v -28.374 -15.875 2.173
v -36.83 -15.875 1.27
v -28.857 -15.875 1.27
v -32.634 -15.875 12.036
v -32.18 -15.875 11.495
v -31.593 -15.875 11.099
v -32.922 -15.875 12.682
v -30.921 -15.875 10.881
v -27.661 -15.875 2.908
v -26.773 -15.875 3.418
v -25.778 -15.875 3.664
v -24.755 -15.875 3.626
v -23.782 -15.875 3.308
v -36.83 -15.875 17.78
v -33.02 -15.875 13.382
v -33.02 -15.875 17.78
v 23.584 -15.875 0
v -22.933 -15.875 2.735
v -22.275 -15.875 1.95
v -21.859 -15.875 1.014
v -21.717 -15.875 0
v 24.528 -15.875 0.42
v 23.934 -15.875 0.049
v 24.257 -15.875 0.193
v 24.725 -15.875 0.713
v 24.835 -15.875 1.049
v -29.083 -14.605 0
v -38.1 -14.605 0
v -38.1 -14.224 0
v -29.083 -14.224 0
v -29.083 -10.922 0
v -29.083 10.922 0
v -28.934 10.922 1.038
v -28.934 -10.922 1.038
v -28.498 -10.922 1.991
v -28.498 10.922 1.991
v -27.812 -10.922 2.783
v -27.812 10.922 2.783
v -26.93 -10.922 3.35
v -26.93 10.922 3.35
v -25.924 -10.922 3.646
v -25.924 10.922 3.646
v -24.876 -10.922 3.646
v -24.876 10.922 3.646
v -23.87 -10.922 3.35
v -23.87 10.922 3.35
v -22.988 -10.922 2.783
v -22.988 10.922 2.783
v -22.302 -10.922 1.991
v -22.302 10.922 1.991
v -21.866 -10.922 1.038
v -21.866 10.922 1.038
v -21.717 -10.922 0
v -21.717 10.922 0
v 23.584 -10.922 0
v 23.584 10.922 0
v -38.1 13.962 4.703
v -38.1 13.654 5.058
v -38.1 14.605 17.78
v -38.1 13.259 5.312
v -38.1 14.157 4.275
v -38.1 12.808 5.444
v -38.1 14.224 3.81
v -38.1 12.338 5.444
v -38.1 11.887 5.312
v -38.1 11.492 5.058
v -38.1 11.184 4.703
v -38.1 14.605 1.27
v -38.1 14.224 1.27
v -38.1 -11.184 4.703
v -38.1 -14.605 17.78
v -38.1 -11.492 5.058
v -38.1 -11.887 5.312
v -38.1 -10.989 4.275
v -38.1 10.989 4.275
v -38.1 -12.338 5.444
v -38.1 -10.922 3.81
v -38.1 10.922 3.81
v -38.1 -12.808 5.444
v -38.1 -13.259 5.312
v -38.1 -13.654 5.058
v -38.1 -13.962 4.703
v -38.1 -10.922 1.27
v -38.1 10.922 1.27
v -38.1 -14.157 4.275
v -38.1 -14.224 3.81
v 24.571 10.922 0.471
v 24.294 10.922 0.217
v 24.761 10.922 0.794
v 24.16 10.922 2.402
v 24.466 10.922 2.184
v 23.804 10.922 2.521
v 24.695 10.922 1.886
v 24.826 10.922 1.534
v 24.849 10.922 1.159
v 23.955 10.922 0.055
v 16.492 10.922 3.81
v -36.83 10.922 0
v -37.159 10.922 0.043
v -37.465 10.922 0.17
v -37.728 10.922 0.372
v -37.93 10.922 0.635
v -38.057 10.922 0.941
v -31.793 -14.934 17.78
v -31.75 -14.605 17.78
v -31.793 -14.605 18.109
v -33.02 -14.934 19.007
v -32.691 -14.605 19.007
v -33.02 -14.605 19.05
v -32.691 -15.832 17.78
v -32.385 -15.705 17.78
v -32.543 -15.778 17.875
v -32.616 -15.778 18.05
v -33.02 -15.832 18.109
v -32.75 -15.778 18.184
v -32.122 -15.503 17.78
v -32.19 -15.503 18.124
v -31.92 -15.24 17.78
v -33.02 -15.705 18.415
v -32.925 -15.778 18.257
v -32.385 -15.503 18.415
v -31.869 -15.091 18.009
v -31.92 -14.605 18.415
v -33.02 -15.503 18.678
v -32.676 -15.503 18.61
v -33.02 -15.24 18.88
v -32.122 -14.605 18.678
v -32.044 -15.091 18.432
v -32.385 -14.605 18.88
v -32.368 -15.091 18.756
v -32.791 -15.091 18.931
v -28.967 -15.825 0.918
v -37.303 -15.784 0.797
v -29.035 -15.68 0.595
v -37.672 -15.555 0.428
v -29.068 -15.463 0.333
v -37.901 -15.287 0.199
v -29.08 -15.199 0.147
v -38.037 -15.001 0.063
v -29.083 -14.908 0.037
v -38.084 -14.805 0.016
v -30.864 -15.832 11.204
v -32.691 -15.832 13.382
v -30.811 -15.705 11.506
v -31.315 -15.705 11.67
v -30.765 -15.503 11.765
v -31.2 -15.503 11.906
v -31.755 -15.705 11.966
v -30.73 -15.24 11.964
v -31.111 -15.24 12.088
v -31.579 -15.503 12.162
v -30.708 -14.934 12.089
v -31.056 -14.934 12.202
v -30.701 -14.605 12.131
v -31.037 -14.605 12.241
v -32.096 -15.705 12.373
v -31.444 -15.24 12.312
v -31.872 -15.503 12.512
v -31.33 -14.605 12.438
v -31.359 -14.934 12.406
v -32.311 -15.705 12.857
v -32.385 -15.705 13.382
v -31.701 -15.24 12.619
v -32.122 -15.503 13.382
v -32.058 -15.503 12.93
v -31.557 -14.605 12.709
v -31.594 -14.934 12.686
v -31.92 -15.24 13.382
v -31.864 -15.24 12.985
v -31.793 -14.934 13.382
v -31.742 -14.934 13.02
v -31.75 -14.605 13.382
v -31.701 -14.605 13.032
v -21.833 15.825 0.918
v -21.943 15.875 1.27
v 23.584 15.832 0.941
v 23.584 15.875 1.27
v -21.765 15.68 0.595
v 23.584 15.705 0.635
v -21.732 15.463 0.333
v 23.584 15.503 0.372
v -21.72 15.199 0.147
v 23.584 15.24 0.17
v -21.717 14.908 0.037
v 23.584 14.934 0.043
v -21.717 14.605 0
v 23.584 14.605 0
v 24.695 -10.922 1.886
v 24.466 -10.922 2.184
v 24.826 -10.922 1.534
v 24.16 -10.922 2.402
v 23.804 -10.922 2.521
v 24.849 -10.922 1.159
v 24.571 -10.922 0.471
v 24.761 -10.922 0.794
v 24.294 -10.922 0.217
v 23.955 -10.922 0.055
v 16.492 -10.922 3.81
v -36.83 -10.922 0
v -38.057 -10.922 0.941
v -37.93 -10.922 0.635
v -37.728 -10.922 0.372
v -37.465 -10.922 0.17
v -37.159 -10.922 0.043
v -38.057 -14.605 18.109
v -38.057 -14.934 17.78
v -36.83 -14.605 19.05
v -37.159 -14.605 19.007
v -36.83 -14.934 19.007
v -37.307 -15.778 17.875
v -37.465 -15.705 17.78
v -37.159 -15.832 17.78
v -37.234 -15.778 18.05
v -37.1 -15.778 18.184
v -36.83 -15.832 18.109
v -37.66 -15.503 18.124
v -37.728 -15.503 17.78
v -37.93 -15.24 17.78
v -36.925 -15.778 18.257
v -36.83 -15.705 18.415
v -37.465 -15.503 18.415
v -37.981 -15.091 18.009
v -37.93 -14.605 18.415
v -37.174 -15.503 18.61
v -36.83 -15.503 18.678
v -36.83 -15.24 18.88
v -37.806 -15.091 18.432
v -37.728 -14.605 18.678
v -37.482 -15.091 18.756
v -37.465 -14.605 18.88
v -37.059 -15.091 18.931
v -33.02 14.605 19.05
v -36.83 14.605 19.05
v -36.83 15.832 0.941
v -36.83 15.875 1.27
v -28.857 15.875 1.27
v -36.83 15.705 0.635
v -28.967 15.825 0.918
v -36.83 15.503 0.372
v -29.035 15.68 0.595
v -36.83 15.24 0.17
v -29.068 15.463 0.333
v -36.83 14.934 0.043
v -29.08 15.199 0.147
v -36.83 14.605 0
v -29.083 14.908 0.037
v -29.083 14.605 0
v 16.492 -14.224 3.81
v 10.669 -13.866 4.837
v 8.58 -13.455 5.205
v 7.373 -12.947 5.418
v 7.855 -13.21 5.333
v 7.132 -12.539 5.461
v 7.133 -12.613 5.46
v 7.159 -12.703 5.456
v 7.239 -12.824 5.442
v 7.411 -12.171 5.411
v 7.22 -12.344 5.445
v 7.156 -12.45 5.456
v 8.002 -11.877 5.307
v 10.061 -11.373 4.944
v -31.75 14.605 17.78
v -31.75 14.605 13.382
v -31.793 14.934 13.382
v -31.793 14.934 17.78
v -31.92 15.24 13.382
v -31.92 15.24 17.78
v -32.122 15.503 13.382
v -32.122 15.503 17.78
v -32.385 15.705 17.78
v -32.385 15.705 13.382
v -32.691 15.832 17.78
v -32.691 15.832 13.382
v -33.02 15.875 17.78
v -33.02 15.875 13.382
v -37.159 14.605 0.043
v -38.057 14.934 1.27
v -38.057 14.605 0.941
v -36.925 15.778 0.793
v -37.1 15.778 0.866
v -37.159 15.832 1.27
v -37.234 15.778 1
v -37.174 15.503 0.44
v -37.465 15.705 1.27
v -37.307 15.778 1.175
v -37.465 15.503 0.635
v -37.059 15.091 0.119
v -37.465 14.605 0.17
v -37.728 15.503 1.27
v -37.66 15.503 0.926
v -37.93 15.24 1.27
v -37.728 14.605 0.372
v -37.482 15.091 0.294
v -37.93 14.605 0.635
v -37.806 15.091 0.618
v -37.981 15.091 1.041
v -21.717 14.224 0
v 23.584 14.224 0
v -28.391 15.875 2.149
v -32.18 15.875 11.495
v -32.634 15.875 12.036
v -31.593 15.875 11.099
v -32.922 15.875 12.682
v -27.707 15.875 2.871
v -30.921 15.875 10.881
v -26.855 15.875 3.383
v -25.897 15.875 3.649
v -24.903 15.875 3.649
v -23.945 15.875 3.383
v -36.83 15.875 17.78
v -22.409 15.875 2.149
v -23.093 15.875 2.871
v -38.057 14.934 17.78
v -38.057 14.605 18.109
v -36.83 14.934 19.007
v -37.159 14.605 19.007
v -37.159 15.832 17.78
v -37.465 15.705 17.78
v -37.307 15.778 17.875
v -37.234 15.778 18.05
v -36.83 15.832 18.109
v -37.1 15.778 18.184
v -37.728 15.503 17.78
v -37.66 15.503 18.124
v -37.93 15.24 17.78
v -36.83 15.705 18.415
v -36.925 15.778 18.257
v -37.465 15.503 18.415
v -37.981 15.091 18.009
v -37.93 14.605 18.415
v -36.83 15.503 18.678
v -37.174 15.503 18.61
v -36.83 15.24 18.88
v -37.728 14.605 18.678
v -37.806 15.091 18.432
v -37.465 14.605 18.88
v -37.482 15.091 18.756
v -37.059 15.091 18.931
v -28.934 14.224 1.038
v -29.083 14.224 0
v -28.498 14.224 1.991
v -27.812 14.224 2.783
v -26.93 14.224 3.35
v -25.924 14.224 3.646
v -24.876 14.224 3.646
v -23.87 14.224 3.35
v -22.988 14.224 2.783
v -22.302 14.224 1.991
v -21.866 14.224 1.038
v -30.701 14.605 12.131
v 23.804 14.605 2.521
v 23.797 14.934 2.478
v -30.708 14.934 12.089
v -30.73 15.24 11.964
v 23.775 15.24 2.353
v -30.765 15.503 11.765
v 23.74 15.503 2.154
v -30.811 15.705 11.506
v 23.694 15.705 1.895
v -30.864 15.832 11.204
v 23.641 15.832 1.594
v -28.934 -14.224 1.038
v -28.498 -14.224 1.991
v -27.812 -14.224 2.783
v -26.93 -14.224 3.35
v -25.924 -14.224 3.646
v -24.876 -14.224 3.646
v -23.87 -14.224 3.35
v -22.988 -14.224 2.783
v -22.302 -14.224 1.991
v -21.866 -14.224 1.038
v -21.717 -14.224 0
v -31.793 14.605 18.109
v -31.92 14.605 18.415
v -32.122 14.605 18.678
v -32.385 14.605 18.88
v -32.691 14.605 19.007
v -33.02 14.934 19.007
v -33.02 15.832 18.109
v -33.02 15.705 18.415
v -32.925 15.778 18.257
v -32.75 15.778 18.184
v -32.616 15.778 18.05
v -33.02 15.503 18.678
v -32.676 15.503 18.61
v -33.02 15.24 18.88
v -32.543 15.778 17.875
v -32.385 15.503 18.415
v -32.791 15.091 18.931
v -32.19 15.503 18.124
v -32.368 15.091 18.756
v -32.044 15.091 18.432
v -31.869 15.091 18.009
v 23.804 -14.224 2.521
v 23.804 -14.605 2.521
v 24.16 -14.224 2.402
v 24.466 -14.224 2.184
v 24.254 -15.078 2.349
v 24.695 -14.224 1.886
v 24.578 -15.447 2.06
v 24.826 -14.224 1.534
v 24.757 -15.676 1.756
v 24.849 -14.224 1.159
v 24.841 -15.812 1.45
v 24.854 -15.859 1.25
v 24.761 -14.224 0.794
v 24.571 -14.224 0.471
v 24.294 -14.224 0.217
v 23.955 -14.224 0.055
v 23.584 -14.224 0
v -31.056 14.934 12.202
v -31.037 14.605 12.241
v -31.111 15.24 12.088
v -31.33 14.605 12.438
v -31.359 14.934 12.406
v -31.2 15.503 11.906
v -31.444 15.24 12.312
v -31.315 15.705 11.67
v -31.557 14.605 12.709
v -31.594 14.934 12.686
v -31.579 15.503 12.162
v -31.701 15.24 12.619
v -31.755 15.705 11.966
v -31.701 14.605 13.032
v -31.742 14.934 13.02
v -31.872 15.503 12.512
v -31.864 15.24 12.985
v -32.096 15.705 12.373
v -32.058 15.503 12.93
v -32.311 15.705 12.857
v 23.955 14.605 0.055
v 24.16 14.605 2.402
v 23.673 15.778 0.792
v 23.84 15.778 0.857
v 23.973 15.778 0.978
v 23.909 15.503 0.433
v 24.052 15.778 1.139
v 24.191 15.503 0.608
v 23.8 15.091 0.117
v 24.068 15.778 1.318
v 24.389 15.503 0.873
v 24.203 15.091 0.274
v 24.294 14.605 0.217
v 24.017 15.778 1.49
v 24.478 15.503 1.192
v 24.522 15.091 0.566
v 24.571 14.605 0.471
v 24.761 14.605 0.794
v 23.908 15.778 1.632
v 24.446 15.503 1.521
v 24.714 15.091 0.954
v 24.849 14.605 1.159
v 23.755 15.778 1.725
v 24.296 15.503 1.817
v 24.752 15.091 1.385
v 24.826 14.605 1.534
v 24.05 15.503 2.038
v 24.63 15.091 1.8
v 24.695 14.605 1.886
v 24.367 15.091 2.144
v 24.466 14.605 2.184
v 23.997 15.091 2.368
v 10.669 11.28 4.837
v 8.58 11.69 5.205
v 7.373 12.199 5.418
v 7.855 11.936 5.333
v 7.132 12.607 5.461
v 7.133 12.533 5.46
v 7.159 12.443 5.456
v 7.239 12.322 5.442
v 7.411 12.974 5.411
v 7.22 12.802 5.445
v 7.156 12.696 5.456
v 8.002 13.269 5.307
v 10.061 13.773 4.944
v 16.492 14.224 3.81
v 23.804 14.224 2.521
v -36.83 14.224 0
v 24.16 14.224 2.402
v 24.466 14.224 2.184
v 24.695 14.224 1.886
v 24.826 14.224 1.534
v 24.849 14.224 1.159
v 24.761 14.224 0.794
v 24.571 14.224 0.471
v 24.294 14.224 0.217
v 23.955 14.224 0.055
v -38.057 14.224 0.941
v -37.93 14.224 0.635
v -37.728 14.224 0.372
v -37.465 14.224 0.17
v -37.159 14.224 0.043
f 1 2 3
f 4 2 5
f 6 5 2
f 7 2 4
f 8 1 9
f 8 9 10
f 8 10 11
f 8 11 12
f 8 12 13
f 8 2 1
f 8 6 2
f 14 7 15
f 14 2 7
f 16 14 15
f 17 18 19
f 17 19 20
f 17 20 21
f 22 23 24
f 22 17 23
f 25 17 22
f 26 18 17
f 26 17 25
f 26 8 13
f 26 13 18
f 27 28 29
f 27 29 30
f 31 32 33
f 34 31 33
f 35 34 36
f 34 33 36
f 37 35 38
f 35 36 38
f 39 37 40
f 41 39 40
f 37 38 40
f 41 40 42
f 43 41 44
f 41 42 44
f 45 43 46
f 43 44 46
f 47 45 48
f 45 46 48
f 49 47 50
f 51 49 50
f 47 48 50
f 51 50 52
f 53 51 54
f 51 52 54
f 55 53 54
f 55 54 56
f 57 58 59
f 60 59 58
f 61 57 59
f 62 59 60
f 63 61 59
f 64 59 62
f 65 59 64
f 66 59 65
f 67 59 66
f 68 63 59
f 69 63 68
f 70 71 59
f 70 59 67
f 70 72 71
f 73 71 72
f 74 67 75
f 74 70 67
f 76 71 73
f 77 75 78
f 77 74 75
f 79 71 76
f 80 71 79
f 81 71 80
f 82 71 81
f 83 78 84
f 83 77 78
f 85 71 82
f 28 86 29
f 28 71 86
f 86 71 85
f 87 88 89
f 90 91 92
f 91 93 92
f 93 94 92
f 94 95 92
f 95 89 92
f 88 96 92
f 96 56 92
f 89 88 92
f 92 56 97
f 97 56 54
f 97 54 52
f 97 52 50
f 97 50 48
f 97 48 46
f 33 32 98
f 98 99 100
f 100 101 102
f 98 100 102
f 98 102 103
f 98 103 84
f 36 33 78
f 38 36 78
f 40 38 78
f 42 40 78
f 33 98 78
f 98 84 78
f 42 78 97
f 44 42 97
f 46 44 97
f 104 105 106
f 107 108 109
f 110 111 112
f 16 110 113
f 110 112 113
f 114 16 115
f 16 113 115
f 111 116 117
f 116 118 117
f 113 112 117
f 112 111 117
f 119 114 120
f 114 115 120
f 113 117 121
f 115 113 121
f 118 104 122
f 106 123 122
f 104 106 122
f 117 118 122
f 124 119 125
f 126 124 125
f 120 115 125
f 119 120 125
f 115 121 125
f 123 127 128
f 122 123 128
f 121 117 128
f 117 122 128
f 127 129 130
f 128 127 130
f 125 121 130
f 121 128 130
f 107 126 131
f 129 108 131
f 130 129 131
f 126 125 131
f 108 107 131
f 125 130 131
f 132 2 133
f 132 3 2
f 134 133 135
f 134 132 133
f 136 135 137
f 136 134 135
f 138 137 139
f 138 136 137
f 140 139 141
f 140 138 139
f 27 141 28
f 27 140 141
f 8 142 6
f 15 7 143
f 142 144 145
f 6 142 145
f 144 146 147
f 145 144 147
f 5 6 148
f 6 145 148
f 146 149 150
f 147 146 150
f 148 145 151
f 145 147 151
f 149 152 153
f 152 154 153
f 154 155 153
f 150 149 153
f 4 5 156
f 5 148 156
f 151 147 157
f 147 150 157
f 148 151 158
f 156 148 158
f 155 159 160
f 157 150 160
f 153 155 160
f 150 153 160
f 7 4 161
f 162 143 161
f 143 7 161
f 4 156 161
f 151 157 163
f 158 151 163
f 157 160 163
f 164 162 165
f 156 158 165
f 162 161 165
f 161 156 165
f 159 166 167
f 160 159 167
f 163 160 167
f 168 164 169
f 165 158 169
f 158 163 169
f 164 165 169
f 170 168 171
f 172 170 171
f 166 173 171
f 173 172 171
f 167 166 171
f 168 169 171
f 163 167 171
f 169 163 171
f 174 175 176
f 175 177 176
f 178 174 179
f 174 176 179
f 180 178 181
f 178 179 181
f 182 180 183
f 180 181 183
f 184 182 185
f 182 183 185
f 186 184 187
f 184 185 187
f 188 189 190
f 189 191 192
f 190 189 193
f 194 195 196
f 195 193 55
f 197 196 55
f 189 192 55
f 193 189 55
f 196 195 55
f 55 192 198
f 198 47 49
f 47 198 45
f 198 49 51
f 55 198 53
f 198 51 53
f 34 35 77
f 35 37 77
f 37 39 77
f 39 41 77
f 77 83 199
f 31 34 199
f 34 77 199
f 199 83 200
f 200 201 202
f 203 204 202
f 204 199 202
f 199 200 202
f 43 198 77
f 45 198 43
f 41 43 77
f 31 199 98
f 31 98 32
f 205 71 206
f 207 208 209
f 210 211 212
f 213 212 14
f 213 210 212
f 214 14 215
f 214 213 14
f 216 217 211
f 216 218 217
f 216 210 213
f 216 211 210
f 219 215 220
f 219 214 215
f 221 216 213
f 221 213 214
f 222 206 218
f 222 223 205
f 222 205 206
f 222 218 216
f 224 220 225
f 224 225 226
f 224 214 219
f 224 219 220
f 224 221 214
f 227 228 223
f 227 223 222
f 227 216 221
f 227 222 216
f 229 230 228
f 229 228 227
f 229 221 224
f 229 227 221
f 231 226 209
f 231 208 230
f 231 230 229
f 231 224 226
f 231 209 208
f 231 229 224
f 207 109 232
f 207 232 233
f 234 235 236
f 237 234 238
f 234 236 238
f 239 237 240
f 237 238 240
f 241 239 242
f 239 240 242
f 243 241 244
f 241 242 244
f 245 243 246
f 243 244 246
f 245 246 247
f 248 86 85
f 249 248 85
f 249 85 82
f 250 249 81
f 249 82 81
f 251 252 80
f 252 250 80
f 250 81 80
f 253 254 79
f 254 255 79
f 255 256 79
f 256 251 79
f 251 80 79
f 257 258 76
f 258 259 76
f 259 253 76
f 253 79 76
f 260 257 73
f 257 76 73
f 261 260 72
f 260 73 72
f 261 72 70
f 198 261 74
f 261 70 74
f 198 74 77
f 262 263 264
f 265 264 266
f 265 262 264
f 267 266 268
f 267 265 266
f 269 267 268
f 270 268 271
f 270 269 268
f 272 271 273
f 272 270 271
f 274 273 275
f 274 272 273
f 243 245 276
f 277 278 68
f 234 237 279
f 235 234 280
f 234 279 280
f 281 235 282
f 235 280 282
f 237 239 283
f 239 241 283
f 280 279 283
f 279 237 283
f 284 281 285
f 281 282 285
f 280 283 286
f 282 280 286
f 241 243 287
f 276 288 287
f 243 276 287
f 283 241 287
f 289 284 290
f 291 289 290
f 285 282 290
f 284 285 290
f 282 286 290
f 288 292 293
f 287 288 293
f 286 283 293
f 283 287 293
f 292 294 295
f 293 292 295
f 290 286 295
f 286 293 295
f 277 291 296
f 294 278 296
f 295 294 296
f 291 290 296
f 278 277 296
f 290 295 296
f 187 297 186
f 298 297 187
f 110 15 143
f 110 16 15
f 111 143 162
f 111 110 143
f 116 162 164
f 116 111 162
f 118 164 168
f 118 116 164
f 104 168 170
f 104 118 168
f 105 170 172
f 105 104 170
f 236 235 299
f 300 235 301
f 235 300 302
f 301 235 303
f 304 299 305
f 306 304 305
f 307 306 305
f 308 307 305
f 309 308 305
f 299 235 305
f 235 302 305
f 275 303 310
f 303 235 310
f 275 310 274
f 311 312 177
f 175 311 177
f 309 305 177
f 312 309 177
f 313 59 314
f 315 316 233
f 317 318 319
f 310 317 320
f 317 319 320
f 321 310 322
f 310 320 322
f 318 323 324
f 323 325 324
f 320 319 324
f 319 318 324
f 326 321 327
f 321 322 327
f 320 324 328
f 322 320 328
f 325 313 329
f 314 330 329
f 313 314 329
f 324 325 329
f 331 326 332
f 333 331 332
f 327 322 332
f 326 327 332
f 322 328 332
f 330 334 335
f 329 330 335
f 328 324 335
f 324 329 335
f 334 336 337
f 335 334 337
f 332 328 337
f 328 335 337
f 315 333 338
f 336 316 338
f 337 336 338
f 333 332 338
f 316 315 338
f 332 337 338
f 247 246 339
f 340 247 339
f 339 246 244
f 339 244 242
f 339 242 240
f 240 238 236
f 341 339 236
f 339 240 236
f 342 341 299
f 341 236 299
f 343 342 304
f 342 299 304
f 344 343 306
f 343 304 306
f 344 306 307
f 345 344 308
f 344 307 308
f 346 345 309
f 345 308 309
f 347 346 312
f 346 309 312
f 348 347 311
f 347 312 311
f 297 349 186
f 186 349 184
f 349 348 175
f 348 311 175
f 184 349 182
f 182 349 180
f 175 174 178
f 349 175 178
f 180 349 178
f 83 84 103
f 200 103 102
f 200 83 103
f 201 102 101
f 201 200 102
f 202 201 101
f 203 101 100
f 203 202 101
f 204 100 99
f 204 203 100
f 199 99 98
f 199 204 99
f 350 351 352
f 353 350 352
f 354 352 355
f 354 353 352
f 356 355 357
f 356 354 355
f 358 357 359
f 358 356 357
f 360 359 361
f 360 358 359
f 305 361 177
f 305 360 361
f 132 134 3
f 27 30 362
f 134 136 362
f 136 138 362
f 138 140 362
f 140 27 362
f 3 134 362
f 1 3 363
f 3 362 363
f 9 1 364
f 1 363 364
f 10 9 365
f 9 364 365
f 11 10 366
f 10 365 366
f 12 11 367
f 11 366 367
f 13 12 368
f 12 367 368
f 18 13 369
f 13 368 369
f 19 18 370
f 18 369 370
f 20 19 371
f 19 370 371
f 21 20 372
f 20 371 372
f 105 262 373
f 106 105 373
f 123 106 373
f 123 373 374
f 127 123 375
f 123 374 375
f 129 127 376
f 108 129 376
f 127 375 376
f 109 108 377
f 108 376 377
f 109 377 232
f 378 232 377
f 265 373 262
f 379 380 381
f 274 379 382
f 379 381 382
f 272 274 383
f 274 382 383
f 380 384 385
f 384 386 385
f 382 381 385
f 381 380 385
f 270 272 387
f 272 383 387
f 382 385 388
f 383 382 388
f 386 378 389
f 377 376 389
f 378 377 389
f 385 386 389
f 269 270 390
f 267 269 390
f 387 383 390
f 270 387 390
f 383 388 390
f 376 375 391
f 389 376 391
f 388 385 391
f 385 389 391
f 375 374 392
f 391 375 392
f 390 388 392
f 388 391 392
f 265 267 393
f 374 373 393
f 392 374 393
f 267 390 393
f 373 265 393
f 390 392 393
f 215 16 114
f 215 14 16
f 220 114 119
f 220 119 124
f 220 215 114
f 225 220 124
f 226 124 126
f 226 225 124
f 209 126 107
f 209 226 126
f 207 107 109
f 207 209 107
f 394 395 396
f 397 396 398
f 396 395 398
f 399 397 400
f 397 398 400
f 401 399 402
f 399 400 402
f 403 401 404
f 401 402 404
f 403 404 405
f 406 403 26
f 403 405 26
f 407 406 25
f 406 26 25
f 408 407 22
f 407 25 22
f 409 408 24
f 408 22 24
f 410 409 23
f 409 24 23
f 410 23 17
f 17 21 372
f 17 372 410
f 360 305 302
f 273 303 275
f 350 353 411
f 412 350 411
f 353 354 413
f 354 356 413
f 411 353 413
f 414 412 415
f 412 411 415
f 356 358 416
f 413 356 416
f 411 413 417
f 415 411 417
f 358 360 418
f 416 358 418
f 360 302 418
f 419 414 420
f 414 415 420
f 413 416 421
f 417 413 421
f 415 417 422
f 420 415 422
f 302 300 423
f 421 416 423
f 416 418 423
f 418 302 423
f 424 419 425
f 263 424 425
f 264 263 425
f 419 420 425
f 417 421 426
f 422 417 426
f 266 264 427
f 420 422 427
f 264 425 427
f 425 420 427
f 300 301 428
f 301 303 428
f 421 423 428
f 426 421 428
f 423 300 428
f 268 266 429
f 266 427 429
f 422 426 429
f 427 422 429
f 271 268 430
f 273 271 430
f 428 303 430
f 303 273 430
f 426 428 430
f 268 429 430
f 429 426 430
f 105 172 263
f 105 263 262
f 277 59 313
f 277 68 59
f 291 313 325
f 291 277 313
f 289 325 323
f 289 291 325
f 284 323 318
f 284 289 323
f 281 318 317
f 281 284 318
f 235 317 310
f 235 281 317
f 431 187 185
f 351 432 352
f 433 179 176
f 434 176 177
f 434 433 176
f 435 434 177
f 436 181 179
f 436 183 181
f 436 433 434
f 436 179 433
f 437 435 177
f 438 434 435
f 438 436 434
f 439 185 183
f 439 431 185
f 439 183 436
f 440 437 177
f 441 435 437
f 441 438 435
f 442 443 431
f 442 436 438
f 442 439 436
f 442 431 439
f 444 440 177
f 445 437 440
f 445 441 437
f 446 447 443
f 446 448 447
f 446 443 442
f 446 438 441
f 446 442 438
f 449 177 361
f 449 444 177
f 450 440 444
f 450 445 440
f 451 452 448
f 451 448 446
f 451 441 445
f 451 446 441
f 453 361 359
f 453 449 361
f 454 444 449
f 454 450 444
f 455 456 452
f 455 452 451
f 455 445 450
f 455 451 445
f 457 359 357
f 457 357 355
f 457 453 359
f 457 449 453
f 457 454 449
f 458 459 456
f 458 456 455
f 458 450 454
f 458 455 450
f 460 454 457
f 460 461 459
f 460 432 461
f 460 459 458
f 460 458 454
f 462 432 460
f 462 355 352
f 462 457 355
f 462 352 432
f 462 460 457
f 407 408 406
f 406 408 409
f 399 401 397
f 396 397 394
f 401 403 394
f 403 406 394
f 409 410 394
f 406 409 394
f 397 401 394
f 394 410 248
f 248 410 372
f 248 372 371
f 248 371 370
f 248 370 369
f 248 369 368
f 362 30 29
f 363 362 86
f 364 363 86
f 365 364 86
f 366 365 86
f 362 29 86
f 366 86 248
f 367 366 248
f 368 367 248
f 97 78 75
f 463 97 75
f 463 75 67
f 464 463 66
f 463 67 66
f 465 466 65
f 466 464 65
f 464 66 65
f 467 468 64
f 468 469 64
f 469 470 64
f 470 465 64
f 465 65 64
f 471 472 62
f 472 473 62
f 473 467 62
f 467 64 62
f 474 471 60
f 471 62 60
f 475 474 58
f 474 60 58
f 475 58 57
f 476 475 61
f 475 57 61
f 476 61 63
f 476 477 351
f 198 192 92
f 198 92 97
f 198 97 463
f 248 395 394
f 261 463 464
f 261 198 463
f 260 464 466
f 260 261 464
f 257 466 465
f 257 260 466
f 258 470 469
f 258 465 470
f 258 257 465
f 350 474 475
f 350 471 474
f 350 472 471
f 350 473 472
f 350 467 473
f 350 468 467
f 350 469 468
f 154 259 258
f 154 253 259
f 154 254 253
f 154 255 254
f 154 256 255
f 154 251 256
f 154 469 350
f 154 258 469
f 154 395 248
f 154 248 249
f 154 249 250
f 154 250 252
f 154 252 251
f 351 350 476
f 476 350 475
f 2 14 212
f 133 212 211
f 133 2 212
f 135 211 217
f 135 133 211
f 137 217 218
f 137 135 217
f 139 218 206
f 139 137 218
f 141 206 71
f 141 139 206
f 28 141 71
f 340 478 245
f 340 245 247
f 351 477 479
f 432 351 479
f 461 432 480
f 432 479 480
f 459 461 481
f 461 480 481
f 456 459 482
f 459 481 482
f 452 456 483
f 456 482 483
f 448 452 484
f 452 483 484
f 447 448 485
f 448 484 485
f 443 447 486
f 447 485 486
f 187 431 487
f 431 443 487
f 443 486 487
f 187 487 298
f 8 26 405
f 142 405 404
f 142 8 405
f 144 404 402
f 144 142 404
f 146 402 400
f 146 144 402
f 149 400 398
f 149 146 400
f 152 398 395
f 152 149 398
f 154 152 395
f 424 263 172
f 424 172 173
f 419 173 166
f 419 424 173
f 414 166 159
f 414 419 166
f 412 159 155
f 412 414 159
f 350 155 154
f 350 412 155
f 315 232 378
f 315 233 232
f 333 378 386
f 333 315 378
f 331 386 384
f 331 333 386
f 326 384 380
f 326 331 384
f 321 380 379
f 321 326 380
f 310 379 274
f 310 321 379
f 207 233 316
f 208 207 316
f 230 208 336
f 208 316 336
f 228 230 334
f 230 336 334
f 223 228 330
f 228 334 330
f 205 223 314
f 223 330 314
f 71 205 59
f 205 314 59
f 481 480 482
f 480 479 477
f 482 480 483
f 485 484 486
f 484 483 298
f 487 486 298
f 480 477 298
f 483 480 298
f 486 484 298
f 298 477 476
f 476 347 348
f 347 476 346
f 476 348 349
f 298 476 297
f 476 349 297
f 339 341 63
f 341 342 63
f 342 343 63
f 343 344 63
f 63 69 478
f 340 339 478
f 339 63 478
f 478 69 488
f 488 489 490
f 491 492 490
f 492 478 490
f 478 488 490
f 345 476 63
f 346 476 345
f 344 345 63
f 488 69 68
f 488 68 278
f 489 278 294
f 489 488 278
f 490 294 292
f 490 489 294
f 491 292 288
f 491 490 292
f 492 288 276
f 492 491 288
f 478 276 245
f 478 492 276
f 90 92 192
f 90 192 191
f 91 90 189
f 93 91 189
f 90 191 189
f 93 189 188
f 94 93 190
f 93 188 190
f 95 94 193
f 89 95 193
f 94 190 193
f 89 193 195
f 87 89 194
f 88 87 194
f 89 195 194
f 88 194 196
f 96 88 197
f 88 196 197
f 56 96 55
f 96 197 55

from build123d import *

# Parameters (mm, degrees)
F1_DEPTH = 15.875
F3_DEPTH = 76.201
F5_DEPTH = 31.751
F6_F1_R  = 1.27
F6_F2_R  = 1.27


with BuildPart() as f1:
    # F0 (on Front) → F1 (new body, symmetric)
    with BuildSketch(Plane.XZ):
        Polygon((-38.1, 19.05), (-38.1, 0), (38.1, 0), (-31.75, 12.3164396025), (-31.75, 19.05), align=None)
    extrude(amount=F1_DEPTH, both=True)

    # F2 (on face) → F3 (cut, through all)
    with BuildSketch(Plane(origin=(-38.1, 0, 0), x_dir=(0, -1, 0), z_dir=(-1, 0, 0))):
        with BuildLine():
            Line((-10.922, 0), (-10.922, 3.81))
            ThreePointArc((-10.922, 3.81), (-12.5728756711, 5.4608756711), (-14.2237513422, 3.81))
            Line((-14.2237513422, 3.81), (-14.2237513422, 0))
            Line((-14.2237513422, 0), (-10.922, 0))
        make_face()
        with BuildLine():
            Line((14.2237513422, 0), (14.2237513422, 3.81))
            ThreePointArc((14.2237513422, 3.81), (12.5728756711, 5.4608756711), (10.922, 3.81))
            Line((10.922, 3.81), (10.922, 0))
            Line((10.922, 0), (14.2237513422, 0))
        make_face()
    extrude(amount=-F3_DEPTH, mode=Mode.SUBTRACT)

    # F4 (on face) → F5 (cut, through all)
    with BuildSketch(Plane(origin=(0, 15.875, 0), x_dir=(-1, 0, 0), z_dir=(0, 1, 0))):
        with BuildLine():
            ThreePointArc((29.083, 0), (25.4, 3.683), (21.717, 0))
            Line((21.717, 0), (29.083, 0))
        make_face()
    extrude(amount=-F5_DEPTH, mode=Mode.SUBTRACT)

    # F6: fillet of radius 1.27 on 17 edges, made by hand

    # F6_f1
    f6_f1_edges = [f1.edges().sort_by_distance(p)[0] for p in [
        (-31.75, 0, 12.3164396025),
    ]]
    fillet(f6_f1_edges, radius=F6_F1_R)

    # F6_f2
    f6_f2_edges = [f1.edges().sort_by_distance(p)[0] for p in [
        (38.1, 0, 0),
        (38.1, 15.0493756711, 0),
        (38.1, -15.0493756711, 0),
        (-31.75, 0, 19.05),
        (-38.1, 0, 19.05),
        (-38.1, 15.0493756711, 0),
        (-38.1, 0, 0),
        (-33.5915, -15.875, 0),
        (8.1915, 15.875, 0),
        (-33.5915, 15.875, 0),
        (3.6997334072, -15.875, 6.0656951439),
        (-38.1, -15.875, 9.525),
        (-38.1, 15.875, 9.525),
        (-34.925, -15.875, 19.05),
        (-34.925, 15.875, 19.05),
        (3.6997334072, 15.875, 6.0656951439),
        (-31.4528764428, 15.875, 12.5657558698),
        (-31.4528764428, -15.875, 12.5657558698),
    ]]
    fillet(f6_f2_edges, radius=F6_F2_R)


solid = f1.part
